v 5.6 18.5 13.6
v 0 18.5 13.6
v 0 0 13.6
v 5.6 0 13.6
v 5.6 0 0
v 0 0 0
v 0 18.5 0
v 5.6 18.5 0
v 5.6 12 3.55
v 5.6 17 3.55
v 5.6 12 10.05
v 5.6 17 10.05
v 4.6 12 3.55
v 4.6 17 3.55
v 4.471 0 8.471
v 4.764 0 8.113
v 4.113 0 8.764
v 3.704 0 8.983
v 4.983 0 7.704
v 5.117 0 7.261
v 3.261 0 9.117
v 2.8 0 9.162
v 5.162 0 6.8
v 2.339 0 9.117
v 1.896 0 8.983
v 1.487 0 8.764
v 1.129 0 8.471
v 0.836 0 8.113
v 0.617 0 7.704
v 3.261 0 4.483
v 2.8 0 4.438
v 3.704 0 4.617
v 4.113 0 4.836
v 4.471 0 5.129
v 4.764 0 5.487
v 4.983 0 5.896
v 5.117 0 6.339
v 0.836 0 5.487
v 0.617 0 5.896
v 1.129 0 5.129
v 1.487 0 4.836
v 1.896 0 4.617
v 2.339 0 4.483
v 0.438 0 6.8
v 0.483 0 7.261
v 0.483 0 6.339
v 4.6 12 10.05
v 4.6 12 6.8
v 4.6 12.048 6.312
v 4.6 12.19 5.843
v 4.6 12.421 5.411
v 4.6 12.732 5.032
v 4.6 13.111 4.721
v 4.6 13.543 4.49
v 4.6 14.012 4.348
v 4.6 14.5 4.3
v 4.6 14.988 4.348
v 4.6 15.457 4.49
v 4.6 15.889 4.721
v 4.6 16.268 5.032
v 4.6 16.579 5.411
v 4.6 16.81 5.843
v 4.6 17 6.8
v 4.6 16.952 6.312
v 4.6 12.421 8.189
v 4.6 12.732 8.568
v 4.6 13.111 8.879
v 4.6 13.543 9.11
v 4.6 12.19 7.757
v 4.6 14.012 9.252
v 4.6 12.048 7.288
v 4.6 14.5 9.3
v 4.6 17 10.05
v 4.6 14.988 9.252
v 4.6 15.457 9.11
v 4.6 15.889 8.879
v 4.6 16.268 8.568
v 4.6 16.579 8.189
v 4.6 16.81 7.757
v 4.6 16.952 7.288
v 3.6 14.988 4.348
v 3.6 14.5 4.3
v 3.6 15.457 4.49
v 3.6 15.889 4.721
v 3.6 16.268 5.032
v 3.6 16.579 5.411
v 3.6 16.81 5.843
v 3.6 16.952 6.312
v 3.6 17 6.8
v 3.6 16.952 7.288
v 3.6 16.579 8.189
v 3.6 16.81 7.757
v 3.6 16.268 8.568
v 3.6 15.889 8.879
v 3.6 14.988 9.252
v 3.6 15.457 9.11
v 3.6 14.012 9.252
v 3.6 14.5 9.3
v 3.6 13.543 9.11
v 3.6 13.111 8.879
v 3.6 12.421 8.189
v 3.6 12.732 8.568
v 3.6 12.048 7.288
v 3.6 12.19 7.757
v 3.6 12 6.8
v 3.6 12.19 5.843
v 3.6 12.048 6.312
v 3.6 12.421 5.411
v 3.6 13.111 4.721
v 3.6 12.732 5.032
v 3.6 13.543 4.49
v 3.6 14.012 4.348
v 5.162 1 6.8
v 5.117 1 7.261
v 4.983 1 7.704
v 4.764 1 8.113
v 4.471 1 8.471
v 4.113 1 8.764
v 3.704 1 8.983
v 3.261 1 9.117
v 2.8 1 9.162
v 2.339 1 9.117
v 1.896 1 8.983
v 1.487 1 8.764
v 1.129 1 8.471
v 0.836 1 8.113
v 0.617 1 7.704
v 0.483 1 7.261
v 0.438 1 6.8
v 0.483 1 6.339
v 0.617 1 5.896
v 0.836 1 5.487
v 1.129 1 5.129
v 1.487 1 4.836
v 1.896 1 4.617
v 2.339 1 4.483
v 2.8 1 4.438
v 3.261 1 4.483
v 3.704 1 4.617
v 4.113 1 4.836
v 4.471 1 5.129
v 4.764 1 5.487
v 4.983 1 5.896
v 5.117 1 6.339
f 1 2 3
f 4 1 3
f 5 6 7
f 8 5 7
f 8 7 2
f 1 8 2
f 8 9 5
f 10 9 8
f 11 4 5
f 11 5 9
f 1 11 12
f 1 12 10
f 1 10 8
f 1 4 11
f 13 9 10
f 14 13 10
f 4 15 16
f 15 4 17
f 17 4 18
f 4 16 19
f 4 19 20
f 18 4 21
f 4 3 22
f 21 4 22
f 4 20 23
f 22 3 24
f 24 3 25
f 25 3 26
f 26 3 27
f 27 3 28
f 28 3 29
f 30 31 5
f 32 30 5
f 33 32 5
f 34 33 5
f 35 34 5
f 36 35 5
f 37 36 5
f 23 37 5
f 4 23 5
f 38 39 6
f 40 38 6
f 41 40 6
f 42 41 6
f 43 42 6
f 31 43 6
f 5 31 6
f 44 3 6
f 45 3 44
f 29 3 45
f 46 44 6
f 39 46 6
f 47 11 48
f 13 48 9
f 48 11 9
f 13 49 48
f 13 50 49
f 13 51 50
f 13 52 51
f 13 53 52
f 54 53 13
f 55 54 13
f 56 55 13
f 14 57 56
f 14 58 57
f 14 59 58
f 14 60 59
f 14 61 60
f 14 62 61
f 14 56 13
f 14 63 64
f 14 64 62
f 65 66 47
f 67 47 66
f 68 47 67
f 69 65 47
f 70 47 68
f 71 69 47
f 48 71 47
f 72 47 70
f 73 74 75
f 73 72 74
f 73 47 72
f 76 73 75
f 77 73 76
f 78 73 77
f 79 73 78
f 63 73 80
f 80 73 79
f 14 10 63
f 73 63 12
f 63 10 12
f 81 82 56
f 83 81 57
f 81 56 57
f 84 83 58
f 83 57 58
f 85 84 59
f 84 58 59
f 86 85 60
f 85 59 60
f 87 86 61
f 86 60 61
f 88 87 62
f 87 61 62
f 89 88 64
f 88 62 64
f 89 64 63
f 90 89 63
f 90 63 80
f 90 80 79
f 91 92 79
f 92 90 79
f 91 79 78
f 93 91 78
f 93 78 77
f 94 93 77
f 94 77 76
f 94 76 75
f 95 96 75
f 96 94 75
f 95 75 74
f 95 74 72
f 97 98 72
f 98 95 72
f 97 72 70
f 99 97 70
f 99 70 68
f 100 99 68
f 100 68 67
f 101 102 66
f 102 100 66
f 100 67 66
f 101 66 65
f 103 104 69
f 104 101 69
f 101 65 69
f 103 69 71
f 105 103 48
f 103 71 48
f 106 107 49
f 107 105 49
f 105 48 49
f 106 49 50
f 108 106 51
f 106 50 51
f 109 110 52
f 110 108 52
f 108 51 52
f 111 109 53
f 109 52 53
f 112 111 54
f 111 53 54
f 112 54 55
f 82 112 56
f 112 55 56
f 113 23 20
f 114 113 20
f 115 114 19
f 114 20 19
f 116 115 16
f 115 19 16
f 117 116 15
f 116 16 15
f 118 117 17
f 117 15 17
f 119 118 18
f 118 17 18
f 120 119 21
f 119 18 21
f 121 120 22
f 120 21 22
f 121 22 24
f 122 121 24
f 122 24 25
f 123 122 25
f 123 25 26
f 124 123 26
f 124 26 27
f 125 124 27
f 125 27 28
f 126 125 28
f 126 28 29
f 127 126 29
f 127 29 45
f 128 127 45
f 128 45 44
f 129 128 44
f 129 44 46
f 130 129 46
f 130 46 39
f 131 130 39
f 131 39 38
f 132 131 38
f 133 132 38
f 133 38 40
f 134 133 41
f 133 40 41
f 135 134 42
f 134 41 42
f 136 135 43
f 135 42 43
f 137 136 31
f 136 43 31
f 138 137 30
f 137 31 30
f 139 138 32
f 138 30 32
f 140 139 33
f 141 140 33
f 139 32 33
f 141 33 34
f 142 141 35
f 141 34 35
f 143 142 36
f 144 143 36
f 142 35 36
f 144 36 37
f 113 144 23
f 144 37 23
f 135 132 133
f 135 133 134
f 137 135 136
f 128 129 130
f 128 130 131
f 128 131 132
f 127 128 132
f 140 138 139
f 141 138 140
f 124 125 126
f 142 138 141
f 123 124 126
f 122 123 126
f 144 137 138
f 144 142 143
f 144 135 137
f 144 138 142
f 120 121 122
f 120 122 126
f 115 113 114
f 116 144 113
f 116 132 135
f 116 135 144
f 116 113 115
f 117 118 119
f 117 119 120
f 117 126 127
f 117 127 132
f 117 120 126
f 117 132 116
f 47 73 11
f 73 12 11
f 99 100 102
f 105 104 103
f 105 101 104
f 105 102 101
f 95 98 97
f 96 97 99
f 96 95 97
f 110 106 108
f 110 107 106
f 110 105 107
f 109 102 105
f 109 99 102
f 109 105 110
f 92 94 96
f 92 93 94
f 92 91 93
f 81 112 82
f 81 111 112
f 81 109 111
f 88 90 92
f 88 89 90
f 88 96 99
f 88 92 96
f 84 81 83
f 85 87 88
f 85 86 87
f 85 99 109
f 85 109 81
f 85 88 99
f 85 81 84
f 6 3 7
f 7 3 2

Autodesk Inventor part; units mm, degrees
ref_plane "YZ Plane" through (0, 0, 0) normal (1, 0, 0) x (0, 1, 0)
ref_plane "XZ Plane" through (0, 0, 0) normal (0, 1, 0) x (-1, 0, 0)
ref_plane "XY Plane" through (0, 0, 0) normal (0, 0, 1) x (1, 0, 0)
sketch "Skizze1" plane through (0, 0, 0) normal (1, 0, 0) x (0, 1, 0)
  line L0 (0, 0) -> (18.5, 0)
  line L1 (18.5, 0) -> (18.5, 13.6)
  line L2 (18.5, 13.6) -> (0, 13.6)
  line L3 (0, 13.6) -> (0, 0)
  dimension "d0" = 18.5
  dimension "d1" = 13.6
extrude "Extrusion1" add sketch "Skizze1" along normal blind 5.6
sketch "Skizze2" plane through (5.6, 0, 0) normal (1, 0, 0) x (0, 0, -1)
  line L0 (0, 18.5) -> (-13.6, 18.5) projected
  line L1 (-13.6, 18.5) -> (-13.6, 0) projected
  line L2 (-13.6, 0) -> (0, 0) projected
  line L3 (0, 0) -> (0, 18.5) projected
  line L4 (-10.05, 12) -> (-3.55, 12)
  line L5 (-3.55, 12) -> (-3.55, 17)
  line L6 (-3.55, 17) -> (-10.05, 17)
  line L7 (-10.05, 17) -> (-10.05, 12)
  line L8 (-10.05, 12) -> (-3.55, 17) construction
  line L9 (-3.55, 12) -> (-10.05, 17) construction
  point P0 (-6.8, 14.5)
  dimension "d4" = 6.5
  dimension "d5" = 5
  dimension "d6" = 1.5
extrude "Extrusion2" cut sketch "Skizze2" against normal blind 1 contours L7 L6 L5 L4
sketch "Skizze3" plane through (0, 0, 0) normal (0, -1, 0) x (1, 0, 0)
  line L0 (0, 13.6) -> (0, 0) projected
  line L1 (0, 0) -> (5.6, 0) projected
  line L2 (5.6, 13.6) -> (5.6, 0) projected
  line L3 (0, 13.6) -> (5.6, 13.6) projected
  circle A0 centre (2.8, 6.8) radius 2.3625
extrude "Extrusion3" cut sketch "Skizze3" against normal blind 1 contours A0
sketch "Skizze4" plane through (4.6, 0, 0) normal (1, 0, 0) x (0, 0, -1)
  line L0 (-3.55, 17) -> (-3.55, 12) projected
  line L1 (-10.05, 17) -> (-3.55, 17) projected
  line L2 (-10.05, 12) -> (-10.05, 17) projected
  line L3 (-3.55, 12) -> (-10.05, 12) projected
  circle A0 centre (-6.8, 14.5) radius 2.5
  point P0 (0, 0)
extrude "Extrusion4" cut sketch "Skizze4" against normal blind 1 contours A0
ref_plane "Arbeitsebene1" through (2.8, 0, 0) normal (-1, 0, 0) x (0, 0, 1)
properties part number "00_huawei_p30_Objectivelensassembly"
